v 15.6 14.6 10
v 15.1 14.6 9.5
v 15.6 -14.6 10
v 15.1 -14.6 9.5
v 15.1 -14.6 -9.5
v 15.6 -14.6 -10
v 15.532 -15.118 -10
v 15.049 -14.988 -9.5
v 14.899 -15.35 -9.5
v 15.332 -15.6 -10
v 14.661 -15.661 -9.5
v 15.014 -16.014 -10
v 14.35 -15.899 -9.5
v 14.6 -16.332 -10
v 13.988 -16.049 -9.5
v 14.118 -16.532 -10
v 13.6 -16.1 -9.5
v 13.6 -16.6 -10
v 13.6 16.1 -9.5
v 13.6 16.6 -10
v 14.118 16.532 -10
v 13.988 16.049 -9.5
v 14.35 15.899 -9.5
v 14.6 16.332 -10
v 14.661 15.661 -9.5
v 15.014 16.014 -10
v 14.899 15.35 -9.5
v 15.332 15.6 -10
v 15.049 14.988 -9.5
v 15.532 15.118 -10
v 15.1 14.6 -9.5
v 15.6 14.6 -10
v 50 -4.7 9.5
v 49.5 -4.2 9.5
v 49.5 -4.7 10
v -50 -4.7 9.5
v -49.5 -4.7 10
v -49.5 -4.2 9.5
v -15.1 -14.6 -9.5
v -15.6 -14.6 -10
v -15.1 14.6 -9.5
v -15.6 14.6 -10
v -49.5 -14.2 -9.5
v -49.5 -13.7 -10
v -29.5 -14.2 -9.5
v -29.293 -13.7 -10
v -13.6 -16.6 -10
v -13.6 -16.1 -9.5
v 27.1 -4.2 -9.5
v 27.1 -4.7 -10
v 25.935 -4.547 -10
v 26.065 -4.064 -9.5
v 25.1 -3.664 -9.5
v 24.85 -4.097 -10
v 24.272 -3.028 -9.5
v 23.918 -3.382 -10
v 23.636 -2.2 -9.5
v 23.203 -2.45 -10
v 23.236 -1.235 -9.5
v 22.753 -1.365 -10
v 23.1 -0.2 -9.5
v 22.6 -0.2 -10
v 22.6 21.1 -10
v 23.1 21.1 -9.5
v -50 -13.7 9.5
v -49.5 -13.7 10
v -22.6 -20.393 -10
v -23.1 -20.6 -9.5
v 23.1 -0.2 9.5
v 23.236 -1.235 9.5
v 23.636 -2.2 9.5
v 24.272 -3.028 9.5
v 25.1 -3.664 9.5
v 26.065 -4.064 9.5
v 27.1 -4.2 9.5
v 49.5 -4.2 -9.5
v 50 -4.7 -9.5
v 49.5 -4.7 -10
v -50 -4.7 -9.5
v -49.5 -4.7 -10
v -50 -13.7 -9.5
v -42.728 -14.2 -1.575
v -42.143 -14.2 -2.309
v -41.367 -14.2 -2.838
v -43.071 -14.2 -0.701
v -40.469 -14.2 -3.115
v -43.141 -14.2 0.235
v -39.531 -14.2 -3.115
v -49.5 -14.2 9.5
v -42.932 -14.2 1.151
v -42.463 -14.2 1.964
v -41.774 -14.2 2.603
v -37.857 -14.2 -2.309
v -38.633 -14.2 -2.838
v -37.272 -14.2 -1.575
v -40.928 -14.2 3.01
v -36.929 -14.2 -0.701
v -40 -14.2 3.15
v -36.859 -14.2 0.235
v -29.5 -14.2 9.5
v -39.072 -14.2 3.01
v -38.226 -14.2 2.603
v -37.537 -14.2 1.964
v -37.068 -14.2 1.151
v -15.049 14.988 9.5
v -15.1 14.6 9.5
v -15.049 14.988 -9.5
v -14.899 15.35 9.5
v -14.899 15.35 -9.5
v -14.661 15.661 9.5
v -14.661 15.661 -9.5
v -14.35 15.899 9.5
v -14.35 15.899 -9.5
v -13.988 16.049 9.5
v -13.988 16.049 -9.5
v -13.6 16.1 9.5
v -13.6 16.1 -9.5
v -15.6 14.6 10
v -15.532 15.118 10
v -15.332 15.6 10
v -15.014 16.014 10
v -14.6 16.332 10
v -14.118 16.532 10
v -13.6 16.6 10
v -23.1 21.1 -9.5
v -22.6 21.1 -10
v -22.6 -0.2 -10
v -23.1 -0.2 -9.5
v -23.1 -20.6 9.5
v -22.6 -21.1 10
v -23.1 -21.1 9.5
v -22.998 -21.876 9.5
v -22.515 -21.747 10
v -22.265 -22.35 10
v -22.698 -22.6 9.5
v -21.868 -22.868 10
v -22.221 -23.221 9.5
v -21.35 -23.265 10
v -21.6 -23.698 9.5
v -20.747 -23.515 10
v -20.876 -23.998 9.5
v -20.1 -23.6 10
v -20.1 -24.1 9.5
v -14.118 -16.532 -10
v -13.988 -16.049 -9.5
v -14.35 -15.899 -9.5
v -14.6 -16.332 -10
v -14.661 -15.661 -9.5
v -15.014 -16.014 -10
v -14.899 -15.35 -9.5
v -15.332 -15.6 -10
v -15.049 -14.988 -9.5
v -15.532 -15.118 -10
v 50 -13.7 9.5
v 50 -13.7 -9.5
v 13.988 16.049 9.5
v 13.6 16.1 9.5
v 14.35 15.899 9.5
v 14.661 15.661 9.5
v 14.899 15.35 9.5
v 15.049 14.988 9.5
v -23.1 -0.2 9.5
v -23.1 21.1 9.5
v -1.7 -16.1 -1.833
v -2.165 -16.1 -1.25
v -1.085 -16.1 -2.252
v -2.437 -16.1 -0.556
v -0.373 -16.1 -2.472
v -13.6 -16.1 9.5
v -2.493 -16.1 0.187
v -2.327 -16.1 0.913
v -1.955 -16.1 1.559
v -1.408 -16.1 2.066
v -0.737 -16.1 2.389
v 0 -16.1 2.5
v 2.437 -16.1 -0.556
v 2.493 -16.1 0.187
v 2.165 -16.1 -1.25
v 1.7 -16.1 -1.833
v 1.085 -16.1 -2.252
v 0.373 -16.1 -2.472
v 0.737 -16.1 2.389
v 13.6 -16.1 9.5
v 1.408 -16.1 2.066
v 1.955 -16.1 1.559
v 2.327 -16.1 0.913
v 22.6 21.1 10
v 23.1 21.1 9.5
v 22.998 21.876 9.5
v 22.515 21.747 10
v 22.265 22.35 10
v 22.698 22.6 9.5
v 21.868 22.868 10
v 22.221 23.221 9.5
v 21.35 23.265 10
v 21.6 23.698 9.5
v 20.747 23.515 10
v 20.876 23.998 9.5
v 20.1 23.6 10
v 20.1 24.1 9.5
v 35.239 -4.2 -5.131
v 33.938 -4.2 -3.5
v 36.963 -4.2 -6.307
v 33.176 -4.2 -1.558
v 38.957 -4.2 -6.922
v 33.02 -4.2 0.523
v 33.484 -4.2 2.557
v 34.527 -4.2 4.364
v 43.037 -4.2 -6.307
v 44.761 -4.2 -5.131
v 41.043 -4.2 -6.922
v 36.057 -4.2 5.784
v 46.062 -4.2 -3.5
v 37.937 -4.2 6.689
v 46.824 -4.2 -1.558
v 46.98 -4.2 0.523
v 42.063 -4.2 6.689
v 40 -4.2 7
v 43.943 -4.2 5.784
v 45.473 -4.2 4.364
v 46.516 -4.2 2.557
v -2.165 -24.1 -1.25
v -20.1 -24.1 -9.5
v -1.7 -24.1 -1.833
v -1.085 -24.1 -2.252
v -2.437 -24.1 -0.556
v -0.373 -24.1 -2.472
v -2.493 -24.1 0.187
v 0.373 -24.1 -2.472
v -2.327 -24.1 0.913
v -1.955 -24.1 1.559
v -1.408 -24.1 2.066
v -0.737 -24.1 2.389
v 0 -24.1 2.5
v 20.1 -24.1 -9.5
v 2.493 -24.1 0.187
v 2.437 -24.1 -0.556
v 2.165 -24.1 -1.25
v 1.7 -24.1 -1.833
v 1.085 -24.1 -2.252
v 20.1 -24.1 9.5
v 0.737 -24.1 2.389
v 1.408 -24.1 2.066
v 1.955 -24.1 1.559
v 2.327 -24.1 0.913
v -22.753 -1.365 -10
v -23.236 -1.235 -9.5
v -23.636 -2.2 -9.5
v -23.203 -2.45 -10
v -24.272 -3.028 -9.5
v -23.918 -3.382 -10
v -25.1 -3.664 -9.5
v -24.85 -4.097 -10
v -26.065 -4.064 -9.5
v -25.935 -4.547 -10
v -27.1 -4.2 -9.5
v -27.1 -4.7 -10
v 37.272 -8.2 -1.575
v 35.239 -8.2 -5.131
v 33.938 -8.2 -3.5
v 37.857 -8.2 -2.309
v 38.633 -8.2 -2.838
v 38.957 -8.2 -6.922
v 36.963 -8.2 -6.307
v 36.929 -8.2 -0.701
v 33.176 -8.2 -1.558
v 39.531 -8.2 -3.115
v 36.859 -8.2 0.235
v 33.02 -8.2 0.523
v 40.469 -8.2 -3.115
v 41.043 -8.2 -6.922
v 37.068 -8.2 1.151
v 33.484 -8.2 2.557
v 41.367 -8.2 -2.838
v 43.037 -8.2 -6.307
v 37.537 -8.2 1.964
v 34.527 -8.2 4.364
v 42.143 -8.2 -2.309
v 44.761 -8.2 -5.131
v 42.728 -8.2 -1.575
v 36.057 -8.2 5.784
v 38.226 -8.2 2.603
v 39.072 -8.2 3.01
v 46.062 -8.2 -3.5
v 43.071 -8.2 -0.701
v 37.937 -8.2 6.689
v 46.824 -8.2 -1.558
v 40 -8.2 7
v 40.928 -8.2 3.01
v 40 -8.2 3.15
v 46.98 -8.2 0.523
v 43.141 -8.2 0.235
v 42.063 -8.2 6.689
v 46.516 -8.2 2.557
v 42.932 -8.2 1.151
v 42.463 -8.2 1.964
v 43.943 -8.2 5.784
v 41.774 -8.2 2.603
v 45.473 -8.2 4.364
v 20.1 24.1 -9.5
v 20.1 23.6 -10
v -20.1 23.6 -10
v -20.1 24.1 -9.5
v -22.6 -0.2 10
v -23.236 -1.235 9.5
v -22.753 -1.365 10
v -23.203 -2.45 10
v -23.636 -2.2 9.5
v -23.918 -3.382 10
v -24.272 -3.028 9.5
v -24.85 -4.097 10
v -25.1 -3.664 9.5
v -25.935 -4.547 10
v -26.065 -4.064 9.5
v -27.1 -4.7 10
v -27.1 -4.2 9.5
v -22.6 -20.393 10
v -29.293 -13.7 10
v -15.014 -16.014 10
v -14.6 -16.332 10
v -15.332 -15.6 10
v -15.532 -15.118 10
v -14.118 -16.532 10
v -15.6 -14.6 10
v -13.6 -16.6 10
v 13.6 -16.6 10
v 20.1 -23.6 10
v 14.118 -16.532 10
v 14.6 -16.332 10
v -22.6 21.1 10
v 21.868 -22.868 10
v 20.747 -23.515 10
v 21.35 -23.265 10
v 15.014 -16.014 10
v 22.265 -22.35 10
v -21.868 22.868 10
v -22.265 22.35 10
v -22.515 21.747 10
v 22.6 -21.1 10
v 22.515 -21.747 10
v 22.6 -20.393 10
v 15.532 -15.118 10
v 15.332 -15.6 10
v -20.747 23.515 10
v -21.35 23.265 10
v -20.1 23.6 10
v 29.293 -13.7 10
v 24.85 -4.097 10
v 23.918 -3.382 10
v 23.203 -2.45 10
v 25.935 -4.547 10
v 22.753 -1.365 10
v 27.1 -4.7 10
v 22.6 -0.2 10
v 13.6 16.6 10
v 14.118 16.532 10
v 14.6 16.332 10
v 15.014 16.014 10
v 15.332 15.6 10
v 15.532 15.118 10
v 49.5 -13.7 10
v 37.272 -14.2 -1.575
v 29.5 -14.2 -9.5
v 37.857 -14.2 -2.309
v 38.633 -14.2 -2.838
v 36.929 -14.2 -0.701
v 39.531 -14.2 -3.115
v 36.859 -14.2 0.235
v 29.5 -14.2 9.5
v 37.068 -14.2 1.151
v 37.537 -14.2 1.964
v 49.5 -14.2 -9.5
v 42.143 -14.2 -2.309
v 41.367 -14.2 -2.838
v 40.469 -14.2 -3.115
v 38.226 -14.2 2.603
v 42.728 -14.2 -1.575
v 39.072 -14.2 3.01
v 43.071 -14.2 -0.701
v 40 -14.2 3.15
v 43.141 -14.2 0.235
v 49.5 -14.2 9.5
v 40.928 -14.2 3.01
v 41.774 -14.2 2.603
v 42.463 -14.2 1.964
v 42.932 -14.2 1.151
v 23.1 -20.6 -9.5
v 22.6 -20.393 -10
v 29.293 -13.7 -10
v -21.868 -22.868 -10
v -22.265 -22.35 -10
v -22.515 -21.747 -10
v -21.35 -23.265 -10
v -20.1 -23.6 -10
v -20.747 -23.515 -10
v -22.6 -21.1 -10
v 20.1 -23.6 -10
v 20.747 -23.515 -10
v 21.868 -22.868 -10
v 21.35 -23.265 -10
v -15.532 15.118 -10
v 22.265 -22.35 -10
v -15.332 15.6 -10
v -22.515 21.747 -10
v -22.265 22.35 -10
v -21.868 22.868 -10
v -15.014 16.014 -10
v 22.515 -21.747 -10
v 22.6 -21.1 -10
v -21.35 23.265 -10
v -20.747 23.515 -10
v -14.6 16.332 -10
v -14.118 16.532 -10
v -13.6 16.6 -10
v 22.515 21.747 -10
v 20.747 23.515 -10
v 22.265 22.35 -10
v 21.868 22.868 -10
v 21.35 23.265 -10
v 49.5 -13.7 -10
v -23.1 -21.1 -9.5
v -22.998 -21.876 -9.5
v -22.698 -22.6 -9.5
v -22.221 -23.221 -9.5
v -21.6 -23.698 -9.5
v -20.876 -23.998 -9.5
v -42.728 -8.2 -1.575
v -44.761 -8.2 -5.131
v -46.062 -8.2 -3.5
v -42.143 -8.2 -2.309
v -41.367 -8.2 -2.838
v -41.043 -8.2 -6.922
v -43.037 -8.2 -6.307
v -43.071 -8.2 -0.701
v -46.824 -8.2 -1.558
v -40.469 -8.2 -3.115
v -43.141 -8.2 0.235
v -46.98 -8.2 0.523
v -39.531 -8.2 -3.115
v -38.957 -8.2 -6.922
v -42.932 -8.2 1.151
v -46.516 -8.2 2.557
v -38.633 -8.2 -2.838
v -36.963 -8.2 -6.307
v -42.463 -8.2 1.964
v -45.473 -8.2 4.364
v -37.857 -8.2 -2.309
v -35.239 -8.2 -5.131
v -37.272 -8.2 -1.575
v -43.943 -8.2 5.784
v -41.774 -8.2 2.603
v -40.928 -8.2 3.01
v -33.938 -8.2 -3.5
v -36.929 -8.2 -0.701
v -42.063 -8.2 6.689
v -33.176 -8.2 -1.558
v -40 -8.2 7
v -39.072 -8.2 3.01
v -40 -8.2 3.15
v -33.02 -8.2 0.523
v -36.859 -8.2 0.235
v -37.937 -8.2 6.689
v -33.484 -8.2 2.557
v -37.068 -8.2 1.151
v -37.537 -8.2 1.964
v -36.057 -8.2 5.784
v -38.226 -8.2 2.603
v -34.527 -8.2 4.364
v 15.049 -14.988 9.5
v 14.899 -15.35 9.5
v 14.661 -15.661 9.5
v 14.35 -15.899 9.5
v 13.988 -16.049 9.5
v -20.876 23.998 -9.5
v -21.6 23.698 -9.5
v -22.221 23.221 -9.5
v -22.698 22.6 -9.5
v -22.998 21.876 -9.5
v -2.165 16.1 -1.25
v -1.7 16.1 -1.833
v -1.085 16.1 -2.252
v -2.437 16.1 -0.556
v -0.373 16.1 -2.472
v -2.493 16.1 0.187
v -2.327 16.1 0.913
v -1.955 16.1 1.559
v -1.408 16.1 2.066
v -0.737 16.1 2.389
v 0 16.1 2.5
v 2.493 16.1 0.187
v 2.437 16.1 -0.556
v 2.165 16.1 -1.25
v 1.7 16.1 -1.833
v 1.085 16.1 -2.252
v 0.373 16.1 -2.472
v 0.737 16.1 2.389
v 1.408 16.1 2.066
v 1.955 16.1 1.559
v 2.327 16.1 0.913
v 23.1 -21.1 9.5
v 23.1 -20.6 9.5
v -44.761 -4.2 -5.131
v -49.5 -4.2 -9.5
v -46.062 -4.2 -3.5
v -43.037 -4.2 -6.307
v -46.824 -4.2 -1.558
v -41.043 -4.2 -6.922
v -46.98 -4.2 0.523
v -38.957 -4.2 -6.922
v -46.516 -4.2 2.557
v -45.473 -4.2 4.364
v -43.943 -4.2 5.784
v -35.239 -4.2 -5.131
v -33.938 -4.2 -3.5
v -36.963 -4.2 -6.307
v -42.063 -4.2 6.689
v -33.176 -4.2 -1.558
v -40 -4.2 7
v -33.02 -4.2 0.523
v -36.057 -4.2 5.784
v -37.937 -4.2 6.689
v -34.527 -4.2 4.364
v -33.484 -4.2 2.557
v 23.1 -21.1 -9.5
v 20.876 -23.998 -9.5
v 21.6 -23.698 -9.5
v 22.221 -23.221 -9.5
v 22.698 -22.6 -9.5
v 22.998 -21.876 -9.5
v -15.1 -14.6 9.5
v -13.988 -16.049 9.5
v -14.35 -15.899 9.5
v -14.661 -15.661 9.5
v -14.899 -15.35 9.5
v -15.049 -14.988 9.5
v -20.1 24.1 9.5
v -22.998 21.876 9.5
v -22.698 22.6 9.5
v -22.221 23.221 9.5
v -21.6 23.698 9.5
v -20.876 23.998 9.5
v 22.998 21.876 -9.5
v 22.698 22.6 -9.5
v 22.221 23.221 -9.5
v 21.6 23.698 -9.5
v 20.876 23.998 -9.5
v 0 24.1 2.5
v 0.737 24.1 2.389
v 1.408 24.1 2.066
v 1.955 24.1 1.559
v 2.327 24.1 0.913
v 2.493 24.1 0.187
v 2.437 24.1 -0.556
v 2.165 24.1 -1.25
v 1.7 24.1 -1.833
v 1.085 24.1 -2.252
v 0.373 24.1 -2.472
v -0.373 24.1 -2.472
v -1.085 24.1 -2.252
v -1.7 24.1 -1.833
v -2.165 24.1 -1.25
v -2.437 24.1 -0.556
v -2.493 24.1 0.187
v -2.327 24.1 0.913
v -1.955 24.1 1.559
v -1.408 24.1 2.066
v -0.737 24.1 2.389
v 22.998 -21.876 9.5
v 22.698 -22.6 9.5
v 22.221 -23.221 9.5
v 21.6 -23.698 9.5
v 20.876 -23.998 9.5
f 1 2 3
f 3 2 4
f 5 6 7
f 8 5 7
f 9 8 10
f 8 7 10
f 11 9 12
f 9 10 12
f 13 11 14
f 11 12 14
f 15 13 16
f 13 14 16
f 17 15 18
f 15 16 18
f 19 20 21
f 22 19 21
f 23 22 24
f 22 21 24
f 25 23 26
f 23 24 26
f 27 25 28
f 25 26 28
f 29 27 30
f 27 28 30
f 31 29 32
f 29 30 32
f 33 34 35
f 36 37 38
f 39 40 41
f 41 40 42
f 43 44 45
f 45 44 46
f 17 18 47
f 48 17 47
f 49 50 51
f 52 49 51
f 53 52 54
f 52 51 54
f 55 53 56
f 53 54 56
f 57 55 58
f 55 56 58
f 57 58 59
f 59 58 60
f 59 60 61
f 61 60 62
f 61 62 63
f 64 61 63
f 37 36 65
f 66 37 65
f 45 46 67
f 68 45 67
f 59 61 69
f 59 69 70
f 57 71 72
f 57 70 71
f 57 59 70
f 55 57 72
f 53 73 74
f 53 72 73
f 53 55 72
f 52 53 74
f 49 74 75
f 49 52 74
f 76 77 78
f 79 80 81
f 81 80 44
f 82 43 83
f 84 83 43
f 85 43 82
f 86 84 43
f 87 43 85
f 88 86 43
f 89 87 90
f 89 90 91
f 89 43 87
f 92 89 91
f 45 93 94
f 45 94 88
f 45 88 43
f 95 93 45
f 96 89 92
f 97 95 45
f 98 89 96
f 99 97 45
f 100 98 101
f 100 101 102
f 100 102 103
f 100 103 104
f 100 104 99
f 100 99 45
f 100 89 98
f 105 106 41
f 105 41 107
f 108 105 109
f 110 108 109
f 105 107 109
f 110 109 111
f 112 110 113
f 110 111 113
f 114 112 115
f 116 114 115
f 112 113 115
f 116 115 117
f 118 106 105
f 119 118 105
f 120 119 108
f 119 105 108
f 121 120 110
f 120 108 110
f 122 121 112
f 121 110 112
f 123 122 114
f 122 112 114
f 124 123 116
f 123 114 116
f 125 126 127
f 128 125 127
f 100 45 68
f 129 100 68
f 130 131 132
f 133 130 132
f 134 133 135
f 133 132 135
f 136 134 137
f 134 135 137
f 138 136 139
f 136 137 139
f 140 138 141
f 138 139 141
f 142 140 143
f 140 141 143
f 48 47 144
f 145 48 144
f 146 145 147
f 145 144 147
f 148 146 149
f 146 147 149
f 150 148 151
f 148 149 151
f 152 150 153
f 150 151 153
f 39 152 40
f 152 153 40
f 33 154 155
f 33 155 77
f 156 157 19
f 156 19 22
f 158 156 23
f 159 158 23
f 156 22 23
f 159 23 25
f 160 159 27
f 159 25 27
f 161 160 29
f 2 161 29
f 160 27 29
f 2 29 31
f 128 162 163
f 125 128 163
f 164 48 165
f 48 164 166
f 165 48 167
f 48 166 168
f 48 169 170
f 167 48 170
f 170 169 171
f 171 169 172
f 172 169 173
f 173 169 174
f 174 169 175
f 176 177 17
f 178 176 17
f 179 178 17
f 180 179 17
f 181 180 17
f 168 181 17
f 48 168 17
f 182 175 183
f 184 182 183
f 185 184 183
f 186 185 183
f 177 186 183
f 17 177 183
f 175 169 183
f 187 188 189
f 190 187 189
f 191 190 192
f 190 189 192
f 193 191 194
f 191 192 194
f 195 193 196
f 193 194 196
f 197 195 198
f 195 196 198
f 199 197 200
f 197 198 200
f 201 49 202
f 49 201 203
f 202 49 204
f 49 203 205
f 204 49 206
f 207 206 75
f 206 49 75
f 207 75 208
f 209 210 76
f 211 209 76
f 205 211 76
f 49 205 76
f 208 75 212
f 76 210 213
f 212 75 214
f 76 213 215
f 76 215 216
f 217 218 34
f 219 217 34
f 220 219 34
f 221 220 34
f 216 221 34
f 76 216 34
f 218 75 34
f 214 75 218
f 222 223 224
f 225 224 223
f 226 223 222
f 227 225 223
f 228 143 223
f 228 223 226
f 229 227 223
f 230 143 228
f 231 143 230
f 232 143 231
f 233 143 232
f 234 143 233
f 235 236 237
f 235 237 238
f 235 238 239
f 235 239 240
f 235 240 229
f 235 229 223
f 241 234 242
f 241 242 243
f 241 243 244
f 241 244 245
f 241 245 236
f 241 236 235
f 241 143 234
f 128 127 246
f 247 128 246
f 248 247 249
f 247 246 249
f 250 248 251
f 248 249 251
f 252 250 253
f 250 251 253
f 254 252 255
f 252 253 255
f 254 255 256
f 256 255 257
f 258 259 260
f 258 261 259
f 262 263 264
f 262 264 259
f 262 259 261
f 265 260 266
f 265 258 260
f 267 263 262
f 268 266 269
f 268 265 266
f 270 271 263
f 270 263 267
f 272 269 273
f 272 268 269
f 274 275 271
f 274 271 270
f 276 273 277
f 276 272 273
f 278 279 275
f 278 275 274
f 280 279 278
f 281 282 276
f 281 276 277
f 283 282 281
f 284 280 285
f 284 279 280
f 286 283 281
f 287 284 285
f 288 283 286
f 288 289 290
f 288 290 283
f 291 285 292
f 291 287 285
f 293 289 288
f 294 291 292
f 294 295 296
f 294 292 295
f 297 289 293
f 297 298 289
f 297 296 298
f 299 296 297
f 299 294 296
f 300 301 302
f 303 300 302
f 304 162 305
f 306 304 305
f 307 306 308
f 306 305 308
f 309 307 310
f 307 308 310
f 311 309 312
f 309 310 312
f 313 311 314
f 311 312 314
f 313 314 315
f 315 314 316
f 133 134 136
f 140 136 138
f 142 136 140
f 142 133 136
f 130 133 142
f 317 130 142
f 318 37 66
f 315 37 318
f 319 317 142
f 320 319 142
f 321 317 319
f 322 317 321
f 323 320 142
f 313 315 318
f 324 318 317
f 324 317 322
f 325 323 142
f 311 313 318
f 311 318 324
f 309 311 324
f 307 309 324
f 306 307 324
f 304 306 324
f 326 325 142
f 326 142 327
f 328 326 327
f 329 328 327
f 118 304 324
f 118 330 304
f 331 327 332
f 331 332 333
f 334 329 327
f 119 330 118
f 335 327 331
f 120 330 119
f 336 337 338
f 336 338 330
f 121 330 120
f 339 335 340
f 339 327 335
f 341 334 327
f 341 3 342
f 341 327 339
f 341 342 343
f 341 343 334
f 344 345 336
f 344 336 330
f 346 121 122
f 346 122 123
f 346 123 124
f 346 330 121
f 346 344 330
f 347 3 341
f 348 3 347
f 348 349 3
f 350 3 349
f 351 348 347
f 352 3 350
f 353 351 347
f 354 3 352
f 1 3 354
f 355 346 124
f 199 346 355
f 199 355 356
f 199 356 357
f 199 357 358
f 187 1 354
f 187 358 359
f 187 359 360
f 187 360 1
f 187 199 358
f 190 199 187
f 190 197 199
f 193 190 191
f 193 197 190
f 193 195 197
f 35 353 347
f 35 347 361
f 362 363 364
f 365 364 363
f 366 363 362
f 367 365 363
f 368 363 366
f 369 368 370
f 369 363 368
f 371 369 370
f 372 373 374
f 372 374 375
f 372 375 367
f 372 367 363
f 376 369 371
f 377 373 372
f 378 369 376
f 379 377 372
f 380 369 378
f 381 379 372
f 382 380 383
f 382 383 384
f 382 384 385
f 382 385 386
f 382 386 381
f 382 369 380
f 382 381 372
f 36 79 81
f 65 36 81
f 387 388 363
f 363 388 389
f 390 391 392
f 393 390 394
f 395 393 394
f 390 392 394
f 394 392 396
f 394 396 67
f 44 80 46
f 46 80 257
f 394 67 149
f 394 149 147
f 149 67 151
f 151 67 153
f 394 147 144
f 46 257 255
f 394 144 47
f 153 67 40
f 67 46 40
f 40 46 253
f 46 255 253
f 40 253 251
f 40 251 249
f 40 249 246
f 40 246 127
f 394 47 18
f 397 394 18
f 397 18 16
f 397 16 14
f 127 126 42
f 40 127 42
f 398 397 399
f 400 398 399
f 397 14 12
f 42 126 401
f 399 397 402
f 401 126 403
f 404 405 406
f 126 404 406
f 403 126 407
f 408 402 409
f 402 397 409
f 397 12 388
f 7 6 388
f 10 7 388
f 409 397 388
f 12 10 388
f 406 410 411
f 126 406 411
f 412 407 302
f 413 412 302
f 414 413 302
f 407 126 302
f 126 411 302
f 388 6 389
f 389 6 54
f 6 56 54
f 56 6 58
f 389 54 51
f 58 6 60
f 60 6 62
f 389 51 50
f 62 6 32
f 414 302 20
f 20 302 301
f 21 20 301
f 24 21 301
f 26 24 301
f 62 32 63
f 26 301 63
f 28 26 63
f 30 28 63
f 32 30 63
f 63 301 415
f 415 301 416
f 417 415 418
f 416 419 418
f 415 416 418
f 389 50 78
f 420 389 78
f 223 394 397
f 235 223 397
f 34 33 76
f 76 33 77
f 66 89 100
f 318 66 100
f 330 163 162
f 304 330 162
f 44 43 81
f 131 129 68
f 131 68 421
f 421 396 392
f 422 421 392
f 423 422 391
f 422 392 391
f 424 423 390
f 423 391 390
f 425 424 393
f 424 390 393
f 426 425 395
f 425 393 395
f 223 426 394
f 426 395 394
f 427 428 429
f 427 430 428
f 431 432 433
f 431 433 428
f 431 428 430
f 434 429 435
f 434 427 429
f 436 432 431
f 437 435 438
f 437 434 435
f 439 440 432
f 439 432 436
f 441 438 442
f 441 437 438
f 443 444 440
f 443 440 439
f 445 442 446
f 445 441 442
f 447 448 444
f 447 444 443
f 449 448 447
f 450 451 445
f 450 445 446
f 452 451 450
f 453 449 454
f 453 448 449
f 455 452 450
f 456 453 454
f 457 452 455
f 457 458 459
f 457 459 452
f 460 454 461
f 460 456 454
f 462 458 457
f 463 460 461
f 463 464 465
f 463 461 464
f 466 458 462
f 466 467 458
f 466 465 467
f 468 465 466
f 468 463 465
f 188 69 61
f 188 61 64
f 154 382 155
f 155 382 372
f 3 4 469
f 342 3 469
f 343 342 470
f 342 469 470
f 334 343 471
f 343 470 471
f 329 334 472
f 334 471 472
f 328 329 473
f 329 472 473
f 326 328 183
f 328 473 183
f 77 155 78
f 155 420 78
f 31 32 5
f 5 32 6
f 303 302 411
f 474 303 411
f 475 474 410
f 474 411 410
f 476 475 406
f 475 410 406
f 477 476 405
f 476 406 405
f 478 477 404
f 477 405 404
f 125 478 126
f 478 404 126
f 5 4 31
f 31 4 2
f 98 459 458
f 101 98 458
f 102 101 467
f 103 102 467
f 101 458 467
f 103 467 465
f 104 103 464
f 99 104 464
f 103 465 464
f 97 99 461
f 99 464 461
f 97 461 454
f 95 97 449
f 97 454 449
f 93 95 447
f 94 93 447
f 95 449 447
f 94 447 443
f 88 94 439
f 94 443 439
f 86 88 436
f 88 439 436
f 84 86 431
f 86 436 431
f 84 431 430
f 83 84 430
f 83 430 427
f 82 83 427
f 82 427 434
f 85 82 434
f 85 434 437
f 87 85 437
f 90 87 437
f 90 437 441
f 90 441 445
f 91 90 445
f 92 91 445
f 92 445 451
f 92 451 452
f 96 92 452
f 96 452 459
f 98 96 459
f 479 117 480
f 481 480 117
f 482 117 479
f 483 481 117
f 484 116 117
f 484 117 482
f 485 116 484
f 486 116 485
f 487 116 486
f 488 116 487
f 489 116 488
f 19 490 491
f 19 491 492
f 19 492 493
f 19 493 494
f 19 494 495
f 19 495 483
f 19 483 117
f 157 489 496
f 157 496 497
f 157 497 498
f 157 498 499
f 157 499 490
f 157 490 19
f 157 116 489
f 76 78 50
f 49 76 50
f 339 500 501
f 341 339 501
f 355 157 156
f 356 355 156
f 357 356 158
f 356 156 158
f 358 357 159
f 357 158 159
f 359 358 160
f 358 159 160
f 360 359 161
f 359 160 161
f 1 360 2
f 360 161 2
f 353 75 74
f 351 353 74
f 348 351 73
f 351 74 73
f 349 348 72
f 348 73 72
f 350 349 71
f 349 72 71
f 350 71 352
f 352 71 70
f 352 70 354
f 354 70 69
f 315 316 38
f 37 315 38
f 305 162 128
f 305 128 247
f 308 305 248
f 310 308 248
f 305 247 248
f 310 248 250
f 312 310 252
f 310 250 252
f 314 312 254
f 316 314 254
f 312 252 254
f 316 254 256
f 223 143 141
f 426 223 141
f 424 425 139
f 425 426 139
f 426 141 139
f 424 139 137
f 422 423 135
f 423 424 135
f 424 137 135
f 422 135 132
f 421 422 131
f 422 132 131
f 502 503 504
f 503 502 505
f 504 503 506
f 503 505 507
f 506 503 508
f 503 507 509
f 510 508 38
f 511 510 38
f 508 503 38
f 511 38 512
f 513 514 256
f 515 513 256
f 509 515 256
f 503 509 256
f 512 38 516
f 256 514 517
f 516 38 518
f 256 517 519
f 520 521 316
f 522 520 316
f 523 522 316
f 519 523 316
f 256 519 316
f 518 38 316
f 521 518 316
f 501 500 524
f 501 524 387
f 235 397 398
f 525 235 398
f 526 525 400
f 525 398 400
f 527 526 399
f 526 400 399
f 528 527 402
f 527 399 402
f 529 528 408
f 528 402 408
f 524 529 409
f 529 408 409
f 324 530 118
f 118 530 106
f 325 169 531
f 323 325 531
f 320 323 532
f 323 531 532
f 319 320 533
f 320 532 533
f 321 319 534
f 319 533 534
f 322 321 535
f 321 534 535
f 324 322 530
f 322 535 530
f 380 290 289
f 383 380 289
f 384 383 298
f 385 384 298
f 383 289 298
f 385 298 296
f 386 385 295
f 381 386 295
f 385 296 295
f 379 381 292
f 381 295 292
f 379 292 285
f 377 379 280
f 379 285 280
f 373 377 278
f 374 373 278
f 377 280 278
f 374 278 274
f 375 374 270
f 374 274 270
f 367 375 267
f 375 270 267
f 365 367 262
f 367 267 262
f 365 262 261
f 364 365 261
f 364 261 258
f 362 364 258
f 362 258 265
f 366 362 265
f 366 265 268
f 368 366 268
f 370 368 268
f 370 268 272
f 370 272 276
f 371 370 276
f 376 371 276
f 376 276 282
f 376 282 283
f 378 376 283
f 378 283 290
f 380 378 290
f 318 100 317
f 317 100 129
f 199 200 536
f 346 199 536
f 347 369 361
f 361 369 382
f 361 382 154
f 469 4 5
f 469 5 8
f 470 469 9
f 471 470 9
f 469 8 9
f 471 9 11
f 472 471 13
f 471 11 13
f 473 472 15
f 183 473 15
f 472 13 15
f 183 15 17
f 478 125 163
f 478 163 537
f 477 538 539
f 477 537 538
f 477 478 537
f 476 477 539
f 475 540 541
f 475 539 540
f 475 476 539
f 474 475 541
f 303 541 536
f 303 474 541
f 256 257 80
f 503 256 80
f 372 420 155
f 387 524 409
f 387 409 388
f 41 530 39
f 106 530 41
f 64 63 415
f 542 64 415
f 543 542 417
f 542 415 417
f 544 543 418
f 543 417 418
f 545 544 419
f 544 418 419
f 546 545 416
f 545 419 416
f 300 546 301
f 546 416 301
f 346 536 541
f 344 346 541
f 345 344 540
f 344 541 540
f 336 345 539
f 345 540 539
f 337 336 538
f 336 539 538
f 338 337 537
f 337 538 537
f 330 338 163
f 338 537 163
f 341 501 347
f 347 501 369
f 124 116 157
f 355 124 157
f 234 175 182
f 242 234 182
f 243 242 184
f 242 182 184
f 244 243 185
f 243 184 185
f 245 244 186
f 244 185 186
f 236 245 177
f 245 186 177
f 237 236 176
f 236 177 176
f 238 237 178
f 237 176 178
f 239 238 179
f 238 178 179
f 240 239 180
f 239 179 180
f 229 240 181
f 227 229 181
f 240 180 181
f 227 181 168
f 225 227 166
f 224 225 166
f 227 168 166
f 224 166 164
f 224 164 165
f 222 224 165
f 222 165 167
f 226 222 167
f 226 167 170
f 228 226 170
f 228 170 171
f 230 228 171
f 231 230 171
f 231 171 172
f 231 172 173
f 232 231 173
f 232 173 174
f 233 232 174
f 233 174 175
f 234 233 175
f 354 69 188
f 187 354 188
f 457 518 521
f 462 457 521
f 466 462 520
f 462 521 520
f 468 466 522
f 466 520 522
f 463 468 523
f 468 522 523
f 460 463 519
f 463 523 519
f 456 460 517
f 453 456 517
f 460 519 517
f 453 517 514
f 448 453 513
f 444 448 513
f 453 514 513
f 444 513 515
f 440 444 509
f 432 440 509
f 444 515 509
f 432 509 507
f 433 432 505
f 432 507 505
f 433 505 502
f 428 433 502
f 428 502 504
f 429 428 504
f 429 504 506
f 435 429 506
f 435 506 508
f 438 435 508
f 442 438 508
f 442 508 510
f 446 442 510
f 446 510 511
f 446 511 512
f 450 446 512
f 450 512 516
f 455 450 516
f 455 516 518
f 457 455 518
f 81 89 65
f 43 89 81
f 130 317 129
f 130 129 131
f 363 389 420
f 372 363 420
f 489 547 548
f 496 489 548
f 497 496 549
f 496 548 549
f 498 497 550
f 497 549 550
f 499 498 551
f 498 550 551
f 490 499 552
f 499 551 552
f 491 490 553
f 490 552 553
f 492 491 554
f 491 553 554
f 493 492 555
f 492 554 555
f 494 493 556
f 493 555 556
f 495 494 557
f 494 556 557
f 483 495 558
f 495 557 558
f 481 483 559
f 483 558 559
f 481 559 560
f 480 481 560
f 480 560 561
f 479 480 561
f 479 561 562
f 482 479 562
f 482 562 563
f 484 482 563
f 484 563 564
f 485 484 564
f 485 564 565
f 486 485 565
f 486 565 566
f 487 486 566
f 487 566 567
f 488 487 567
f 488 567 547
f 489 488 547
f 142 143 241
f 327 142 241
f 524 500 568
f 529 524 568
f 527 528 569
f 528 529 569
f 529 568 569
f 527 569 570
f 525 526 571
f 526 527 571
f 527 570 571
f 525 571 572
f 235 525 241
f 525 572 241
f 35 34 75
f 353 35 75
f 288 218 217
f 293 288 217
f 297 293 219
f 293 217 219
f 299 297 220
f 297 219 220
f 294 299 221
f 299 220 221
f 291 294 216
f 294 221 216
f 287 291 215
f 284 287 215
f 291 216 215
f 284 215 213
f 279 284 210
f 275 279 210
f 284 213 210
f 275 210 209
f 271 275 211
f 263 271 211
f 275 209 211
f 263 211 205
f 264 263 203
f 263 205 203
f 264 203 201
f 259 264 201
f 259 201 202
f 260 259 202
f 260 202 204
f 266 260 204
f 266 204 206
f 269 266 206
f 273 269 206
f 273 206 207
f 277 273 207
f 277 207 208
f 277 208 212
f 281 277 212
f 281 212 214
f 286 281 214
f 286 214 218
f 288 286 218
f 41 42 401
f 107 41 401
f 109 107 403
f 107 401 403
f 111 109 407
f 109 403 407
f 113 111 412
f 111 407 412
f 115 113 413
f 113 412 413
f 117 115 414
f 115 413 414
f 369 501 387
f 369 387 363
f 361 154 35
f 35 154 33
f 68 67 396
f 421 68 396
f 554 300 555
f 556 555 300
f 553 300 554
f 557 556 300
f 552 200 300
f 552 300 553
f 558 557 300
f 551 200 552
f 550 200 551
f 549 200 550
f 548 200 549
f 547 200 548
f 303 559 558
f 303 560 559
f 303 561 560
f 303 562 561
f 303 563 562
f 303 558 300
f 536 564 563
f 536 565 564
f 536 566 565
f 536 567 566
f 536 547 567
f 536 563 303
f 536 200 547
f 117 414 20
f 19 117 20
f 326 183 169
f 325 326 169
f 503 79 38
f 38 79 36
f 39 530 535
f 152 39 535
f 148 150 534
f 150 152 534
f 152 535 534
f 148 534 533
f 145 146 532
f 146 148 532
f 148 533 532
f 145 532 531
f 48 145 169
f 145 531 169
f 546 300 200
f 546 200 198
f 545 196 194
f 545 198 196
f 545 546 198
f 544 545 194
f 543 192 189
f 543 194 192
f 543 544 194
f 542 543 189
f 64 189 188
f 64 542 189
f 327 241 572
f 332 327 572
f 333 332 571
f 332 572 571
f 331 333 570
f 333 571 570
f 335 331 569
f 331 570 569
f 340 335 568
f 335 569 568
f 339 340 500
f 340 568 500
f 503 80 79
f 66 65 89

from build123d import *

# Parameters (mm, degrees)
SKETCH1_W           = 30.2
SKETCH1_H           = 32.2
BOSS_EXTRUDE1_DEPTH = 10
FILLET1_R           = 1.5
SKETCH3_R           = 3.15
CUT_EXTRUDE1_DEPTH  = 71.165803637
SKETCH6_W           = 53.8
SKETCH6_H           = 56.6
CUT_EXTRUDE4_DEPTH  = 59.998389809
SKETCH4_R           = 7
CUT_EXTRUDE2_DEPTH  = 32.3
FILLET2_R           = 3
FILLET3_R           = 4
CHAMFER1_SIZE       = 0.5
SKETCH5_R           = 2.5
CUT_EXTRUDE3_DEPTH  = 71.165803637


with BuildPart() as part:
    # Sketch1 → Boss-Extrude1 (new, symmetric)
    with BuildSketch(Plane.XY):
        Polygon((-50, -14.2), (-29.5, -14.2), (-23.1, -20.6), (-23.1, -24.1), (23.1, -24.1), (23.1, -20.6), (29.5, -14.2), (50, -14.2), (50, 24.1), (-50, 24.1), align=None)
        Rectangle(SKETCH1_W, SKETCH1_H, mode=Mode.SUBTRACT)
    extrude(amount=BOSS_EXTRUDE1_DEPTH, both=True)

    # Fillet1
    fillet1_edges = [part.edges().sort_by_distance(p)[0] for p in [
        (15.1, -16.1, 0),
        (15.1, 16.1, 0),
        (-15.1, 16.1, 0),
        (-15.1, -16.1, 0),
    ]]
    fillet(fillet1_edges, radius=FILLET1_R)

    # Sketch3 → Cut-Extrude1 (cut, through all)
    with BuildSketch(Plane(origin=(0, 24.1, 0), x_dir=(1, 0, 0), z_dir=(0, 1, 0))):
        with Locations(Location((-40, 0, 0), (0, 0, 270))):
            Circle(SKETCH3_R)
        with Locations(Location((40, 0, 0), (0, 0, 270))):
            Circle(SKETCH3_R)
    extrude(amount=-CUT_EXTRUDE1_DEPTH, mode=Mode.SUBTRACT)

    # Sketch6 → Cut-Extrude4 (cut, through all)
    with BuildSketch(Plane.XY.offset(10)):
        with Locations((-50, 24.1)):
            Rectangle(SKETCH6_W, SKETCH6_H)
        with Locations((50, 24.1)):
            Rectangle(SKETCH6_W, SKETCH6_H)
    extrude(amount=-CUT_EXTRUDE4_DEPTH, mode=Mode.SUBTRACT)

    # Sketch4 → Cut-Extrude2 (cut)
    with BuildSketch(Plane(origin=(0, 24.1, 0), x_dir=(1, 0, 0), z_dir=(0, 1, 0))):
        with Locations(Location((-40, 0, 0), (0, 0, 270))):
            Circle(SKETCH4_R)
        with Locations(Location((40, 0, 0), (0, 0, 270))):
            Circle(SKETCH4_R)
    extrude(amount=-CUT_EXTRUDE2_DEPTH, mode=Mode.SUBTRACT)

    # Fillet2
    fillet2_edges = [part.edges().sort_by_distance(p)[0] for p in [
        (23.1, -24.1, 0),
        (-23.1, -24.1, 0),
        (23.1, 24.1, 0),
        (-23.1, 24.1, 0),
    ]]
    fillet(fillet2_edges, radius=FILLET2_R)

    # Fillet3
    fillet3_edges = [part.edges().sort_by_distance(p)[0] for p in [
        (23.1, -4.2, 0),
        (-23.1, -4.2, 0),
    ]]
    fillet(fillet3_edges, radius=FILLET3_R)

    # Chamfer1
    chamfer1_edges = [part.edges().sort_by_distance(p)[0] for p in [
        (50, -4.2, 0),
        (50, -9.2, -10),
        (39.75, -14.2, -10),
        (26.3, -17.4, -10),
        (-23.1, -20.85, -10),
        (-26.3, -17.4, 10),
        (-26.3, -17.4, -10),
        (-39.75, -14.2, -10),
        (0, 24.1, -10),
        (0, 24.1, 10),
        (23.1, 10.45, -10),
        (23.1, -20.85, -10),
        (0, -24.1, -10),
        (-22.221320344, -23.221320344, -10),
        (22.221320344, -23.221320344, -10),
        (-22.221320344, 23.221320344, -10),
        (22.221320344, 23.221320344, -10),
        (23.1, 10.45, 10),
        (0, -24.1, 10),
        (23.1, -20.85, 10),
        (-22.221320344, -23.221320344, 10),
        (22.221320344, -23.221320344, 10),
        (-22.221320344, 23.221320344, 10),
        (22.221320344, 23.221320344, 10),
        (38.55, -4.2, -10),
        (38.55, -4.2, 10),
        (-23.1, 10.45, 10),
        (-23.1, 10.45, -10),
        (24.271572875, -3.028427125, 10),
        (-23.1, -20.85, 10),
        (24.271572875, -3.028427125, -10),
        (-24.271572875, -3.028427125, 10),
        (-24.271572875, -3.028427125, -10),
        (50, -14.2, 0),
        (-50, -14.2, 0),
        (26.3, -17.4, 10),
        (39.75, -14.2, 10),
        (50, -9.2, 10),
        (-15.1, 0, -10),
        (-15.1, 0, 10),
        (0, -16.1, -10),
        (0, -16.1, 10),
        (15.1, 0, -10),
        (15.1, 0, 10),
        (0, 16.1, -10),
        (0, 16.1, 10),
        (-14.660660172, -15.660660172, -10),
        (-14.660660172, -15.660660172, 10),
        (14.660660172, -15.660660172, -10),
        (14.660660172, -15.660660172, 10),
        (14.660660172, 15.660660172, -10),
        (14.660660172, 15.660660172, 10),
        (-14.660660172, 15.660660172, -10),
        (-14.660660172, 15.660660172, 10),
        (-50, -9.2, -10),
        (-50, -9.2, 10),
        (-38.55, -4.2, 10),
        (-39.75, -14.2, 10),
        (-50, -4.2, 0),
        (-38.55, -4.2, -10),
    ]]
    chamfer(chamfer1_edges, length=CHAMFER1_SIZE)

    # Sketch5 → Cut-Extrude3 (cut, through all)
    with BuildSketch(Plane(origin=(0, 24.1, 0), x_dir=(1, 0, 0), z_dir=(0, 1, 0))):
        with Locations(Location((0, 0, 0), (0, 0, 270))):
            Circle(SKETCH5_R)
    extrude(amount=-CUT_EXTRUDE3_DEPTH, mode=Mode.SUBTRACT)


solid = part.part
